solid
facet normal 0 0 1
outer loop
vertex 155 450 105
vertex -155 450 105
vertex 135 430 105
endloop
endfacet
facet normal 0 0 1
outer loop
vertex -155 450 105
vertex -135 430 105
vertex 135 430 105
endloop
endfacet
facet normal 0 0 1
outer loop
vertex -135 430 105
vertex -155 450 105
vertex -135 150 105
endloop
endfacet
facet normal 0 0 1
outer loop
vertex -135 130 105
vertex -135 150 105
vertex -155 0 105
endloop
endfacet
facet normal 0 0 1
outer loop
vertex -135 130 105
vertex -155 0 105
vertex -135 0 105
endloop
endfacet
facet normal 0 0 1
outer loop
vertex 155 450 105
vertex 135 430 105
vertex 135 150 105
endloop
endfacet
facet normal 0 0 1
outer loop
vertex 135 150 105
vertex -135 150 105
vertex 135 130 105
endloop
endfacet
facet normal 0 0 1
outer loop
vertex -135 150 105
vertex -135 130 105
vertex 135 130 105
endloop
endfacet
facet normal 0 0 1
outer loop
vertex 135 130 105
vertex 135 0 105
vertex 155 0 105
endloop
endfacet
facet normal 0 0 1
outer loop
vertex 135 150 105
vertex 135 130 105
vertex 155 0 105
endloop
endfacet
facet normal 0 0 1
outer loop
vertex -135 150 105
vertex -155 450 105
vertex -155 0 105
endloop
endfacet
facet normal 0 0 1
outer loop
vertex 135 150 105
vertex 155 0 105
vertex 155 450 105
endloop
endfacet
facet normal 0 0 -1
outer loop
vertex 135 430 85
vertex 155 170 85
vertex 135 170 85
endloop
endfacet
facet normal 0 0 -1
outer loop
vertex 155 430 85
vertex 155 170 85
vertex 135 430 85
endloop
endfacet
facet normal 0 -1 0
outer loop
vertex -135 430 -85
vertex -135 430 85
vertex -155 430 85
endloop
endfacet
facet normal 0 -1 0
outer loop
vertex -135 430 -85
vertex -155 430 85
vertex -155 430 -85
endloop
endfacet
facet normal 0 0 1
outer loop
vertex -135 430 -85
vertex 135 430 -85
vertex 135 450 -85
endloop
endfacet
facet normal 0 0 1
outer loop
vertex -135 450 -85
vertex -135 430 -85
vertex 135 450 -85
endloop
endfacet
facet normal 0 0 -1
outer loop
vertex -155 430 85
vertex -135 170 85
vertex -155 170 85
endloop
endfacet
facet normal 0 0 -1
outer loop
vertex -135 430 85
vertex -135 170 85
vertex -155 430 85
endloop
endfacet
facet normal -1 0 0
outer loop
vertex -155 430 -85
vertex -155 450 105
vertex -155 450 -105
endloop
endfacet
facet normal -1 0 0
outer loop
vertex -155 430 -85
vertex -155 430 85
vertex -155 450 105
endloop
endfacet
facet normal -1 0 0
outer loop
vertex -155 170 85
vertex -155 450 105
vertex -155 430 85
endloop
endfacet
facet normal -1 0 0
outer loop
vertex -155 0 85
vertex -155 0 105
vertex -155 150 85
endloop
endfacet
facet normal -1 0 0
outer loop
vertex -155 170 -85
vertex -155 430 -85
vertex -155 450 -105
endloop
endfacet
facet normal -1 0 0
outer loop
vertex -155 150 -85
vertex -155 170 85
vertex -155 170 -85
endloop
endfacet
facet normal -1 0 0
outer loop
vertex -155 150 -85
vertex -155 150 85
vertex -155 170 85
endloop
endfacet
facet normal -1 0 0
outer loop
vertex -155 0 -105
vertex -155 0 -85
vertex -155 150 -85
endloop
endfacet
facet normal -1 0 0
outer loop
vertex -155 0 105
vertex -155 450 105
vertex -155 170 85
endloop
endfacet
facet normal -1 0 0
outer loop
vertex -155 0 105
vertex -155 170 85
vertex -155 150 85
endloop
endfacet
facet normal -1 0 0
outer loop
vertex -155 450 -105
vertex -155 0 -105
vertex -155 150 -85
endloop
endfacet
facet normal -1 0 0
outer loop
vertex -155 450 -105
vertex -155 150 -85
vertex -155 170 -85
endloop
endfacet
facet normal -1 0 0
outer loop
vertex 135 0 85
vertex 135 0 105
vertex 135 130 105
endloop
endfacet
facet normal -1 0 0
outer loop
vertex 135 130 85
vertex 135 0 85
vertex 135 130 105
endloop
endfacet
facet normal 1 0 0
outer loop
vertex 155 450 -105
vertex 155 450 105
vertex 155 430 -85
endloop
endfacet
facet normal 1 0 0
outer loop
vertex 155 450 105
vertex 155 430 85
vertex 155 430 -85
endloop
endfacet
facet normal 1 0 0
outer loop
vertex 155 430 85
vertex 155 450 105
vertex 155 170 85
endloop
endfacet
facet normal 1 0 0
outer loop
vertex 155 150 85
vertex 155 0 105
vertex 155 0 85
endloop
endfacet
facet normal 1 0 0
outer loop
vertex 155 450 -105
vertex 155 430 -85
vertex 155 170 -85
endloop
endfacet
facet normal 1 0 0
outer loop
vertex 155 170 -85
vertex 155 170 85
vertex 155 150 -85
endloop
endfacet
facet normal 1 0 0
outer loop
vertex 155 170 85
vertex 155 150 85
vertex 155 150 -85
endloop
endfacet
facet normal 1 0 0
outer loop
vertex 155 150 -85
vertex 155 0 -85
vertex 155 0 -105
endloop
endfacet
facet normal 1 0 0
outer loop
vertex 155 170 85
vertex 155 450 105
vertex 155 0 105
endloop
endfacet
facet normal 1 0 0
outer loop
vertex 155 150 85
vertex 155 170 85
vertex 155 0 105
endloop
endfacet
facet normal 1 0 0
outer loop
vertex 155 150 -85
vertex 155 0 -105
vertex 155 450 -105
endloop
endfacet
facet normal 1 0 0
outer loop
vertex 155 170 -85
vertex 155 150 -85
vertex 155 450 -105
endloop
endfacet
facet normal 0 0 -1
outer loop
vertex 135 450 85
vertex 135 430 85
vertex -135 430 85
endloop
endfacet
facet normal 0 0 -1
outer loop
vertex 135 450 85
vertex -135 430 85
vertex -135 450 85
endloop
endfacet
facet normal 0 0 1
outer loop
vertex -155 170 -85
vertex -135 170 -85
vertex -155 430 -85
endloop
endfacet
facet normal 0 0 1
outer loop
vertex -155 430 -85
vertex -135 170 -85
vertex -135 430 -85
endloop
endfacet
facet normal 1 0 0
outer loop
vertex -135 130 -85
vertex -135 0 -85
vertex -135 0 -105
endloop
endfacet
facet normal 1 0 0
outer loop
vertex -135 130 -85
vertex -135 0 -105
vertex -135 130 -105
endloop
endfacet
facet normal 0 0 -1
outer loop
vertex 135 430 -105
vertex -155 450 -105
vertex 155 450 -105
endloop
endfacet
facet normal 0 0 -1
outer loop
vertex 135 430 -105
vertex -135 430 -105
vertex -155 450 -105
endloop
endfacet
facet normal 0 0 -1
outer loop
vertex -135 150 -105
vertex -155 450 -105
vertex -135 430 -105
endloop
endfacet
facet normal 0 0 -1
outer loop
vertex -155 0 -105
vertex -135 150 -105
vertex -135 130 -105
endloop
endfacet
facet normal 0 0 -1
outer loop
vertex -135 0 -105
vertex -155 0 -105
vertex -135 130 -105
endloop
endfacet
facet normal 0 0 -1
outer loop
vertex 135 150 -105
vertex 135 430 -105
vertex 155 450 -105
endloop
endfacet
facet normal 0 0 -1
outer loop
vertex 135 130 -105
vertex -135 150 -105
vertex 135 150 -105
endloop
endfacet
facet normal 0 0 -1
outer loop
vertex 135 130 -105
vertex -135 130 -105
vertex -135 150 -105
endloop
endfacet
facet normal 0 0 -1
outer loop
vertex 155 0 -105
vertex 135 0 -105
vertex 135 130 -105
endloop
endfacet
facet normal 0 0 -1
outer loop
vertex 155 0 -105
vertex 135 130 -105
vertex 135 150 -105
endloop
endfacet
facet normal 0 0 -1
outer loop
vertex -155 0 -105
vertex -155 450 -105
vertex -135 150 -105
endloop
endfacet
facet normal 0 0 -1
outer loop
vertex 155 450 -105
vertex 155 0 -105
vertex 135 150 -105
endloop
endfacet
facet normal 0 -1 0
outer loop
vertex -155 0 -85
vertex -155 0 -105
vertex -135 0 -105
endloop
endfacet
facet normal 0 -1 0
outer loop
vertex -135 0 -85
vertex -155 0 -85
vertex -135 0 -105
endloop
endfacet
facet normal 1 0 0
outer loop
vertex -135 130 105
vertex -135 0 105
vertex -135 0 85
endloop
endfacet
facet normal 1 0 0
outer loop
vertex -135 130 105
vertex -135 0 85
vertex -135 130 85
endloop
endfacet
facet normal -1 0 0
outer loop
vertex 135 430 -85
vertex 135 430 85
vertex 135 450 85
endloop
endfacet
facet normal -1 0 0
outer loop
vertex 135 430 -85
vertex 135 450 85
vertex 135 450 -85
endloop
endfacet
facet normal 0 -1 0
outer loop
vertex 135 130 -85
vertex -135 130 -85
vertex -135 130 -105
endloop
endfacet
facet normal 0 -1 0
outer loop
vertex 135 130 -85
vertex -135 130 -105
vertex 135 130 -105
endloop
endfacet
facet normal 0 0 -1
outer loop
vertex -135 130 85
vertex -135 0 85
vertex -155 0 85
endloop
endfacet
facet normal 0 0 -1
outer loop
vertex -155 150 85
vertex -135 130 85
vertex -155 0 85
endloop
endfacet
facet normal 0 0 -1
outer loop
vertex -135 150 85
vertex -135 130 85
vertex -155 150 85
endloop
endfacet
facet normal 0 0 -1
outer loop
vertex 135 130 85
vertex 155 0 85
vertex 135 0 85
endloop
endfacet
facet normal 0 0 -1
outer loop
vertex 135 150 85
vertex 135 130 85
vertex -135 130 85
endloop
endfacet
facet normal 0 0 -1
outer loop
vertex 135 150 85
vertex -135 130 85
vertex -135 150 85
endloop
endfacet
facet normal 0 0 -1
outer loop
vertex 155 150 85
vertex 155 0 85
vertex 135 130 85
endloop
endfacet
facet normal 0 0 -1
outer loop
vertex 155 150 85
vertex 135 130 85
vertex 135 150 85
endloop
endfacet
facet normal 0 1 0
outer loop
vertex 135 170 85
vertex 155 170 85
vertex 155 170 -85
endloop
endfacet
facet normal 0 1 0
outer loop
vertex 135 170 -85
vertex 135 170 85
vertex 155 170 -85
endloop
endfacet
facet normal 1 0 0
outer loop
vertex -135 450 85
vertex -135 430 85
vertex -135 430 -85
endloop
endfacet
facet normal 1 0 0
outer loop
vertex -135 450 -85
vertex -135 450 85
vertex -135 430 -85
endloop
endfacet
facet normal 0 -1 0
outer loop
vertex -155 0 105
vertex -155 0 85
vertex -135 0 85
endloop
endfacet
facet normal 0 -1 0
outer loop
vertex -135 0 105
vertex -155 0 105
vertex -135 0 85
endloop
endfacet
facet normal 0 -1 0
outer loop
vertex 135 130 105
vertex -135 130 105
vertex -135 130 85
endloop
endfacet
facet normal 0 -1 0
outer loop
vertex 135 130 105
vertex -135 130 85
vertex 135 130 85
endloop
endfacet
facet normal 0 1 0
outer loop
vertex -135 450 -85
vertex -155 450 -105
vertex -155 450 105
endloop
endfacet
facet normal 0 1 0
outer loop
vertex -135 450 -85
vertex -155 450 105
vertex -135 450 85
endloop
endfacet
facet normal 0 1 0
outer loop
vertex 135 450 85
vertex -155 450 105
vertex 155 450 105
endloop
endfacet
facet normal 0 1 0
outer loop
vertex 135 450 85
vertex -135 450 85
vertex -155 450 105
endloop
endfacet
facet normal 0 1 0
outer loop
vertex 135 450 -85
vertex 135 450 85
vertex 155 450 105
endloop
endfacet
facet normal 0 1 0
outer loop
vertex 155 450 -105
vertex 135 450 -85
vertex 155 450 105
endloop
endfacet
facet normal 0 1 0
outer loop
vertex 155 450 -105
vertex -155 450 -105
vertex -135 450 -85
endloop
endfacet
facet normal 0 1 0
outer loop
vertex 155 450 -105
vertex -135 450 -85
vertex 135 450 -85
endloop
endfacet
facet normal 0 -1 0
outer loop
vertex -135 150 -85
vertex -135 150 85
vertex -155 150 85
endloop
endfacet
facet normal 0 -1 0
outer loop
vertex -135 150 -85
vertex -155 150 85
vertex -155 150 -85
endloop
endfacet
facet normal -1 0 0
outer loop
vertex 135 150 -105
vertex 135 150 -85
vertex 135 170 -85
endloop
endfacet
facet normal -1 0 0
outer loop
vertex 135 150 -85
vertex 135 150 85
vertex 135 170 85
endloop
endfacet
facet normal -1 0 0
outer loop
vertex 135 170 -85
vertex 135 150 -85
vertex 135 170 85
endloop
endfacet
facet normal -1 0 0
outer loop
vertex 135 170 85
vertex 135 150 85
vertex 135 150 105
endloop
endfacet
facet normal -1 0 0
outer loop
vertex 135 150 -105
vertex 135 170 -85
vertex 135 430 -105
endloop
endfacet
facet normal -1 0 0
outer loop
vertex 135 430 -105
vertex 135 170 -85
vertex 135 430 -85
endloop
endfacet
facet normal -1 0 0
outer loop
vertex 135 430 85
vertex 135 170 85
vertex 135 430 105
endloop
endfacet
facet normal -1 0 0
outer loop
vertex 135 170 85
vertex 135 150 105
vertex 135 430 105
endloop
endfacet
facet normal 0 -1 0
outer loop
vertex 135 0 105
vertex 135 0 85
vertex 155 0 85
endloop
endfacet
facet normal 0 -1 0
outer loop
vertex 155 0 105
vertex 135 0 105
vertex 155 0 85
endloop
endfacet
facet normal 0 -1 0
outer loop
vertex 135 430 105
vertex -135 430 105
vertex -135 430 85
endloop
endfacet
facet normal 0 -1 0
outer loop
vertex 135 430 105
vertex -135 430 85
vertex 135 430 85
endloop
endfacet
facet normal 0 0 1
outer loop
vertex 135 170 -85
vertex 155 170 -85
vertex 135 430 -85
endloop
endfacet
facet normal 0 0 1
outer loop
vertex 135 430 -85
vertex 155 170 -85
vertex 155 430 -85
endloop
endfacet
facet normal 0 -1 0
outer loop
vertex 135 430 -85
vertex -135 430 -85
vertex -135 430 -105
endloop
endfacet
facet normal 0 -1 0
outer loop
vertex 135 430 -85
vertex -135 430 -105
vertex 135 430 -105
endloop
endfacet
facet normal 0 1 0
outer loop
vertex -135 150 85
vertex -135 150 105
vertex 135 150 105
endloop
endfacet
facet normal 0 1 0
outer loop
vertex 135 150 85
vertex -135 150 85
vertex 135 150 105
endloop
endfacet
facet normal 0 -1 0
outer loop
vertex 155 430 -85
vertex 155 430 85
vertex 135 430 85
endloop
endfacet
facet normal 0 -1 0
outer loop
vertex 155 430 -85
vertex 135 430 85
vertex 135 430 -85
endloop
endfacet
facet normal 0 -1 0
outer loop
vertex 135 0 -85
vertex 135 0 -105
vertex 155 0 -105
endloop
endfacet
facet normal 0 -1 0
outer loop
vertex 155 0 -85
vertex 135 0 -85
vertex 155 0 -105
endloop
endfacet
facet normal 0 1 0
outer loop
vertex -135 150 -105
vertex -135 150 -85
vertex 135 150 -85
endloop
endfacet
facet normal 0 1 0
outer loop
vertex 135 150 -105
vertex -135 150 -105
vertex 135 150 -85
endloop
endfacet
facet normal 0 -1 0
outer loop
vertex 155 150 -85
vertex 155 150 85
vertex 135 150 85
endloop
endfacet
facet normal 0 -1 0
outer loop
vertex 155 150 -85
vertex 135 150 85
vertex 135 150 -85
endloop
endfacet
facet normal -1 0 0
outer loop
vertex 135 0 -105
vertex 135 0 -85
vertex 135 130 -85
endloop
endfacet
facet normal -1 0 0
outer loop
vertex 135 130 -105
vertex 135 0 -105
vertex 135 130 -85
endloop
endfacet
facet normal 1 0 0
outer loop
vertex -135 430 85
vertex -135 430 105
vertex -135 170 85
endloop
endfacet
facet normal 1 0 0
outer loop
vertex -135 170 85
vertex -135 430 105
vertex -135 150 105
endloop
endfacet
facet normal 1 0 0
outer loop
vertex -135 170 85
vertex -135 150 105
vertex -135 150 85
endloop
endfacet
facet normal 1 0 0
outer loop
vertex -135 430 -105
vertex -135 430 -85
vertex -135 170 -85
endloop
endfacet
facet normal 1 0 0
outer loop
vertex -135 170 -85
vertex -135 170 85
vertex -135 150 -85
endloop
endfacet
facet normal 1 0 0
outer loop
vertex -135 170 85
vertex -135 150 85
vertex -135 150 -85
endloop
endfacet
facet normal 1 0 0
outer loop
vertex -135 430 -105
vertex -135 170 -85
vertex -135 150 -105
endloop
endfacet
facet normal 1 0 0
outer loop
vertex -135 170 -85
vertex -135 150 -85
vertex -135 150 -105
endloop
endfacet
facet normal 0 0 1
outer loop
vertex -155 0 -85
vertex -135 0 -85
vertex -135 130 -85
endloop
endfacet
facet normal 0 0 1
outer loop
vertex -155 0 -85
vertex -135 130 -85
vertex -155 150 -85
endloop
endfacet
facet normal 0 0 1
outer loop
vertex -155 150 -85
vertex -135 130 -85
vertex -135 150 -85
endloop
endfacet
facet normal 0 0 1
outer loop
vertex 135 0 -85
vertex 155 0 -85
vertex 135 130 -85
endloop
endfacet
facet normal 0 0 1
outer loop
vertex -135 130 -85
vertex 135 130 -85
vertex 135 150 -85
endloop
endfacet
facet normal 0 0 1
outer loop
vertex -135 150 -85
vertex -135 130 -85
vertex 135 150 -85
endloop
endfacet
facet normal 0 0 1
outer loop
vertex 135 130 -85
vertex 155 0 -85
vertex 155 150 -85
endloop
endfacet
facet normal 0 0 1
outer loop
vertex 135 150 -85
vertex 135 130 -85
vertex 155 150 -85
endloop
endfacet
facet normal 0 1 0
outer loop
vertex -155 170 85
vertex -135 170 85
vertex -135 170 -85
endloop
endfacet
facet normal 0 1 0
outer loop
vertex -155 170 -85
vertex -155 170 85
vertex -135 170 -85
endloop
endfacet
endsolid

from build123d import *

# Parameters (mm, degrees)
SKETCH_1_W          = 310
SKETCH_1_H          = 210
SKETCH_1_W_2        = 270
SKETCH_1_H_2        = 170
EXTRUDE_1_DEPTH     = 450
SKETCH_8_W          = 170
SKETCH_8_H          = 260
CUT_EXTRUDE_3_DEPTH = 310
SKETCH_11_W         = 170
SKETCH_11_H         = 150
CUT_EXTRUDE_4_DEPTH = 310
SKETCH_13_W         = 270
SKETCH_13_H         = 130
CUT_EXTRUDE_5_DEPTH = 521.216301167
SKETCH_14_W         = 270
SKETCH_14_H         = 280
CUT_EXTRUDE_6_DEPTH = 525.332909515


with BuildPart() as part:
    # 草图1 → 凸台-拉伸1 (new body)
    with BuildSketch(Plane(origin=(0, 0, 0), x_dir=(1, 0, 0), z_dir=(0, 1, 0))):
        Rectangle(SKETCH_1_W, SKETCH_1_H)
        Rectangle(SKETCH_1_W_2, SKETCH_1_H_2, mode=Mode.SUBTRACT)
    extrude(amount=EXTRUDE_1_DEPTH)

    # 草图8 → 切除-拉伸3 (cut)
    with BuildSketch(Plane(origin=(155, 0, 0), x_dir=(0, 0, -1), z_dir=(1, 0, 0))):
        with Locations((0, 300)):
            Rectangle(SKETCH_8_W, SKETCH_8_H)
    extrude(amount=-CUT_EXTRUDE_3_DEPTH, mode=Mode.SUBTRACT)

    # 草图11 → 切除-拉伸4 (cut)
    with BuildSketch(Plane(origin=(155, 0, 0), x_dir=(0, 0, -1), z_dir=(1, 0, 0))):
        with Locations((0, 75)):
            Rectangle(SKETCH_11_W, SKETCH_11_H)
    extrude(amount=-CUT_EXTRUDE_4_DEPTH, mode=Mode.SUBTRACT)

    # 草图13 → 切除-拉伸5 (cut, through all)
    with BuildSketch(Plane.XY.offset(105)):
        with Locations((0, 65)):
            Rectangle(SKETCH_13_W, SKETCH_13_H)
    extrude(amount=-CUT_EXTRUDE_5_DEPTH, mode=Mode.SUBTRACT)

    # 草图14 → 切除-拉伸6 (cut, through all)
    with BuildSketch(Plane.XY.offset(115)):
        with Locations((0, 290)):
            Rectangle(SKETCH_14_W, SKETCH_14_H)
    extrude(amount=-CUT_EXTRUDE_6_DEPTH, mode=Mode.SUBTRACT)


solid = part.part
